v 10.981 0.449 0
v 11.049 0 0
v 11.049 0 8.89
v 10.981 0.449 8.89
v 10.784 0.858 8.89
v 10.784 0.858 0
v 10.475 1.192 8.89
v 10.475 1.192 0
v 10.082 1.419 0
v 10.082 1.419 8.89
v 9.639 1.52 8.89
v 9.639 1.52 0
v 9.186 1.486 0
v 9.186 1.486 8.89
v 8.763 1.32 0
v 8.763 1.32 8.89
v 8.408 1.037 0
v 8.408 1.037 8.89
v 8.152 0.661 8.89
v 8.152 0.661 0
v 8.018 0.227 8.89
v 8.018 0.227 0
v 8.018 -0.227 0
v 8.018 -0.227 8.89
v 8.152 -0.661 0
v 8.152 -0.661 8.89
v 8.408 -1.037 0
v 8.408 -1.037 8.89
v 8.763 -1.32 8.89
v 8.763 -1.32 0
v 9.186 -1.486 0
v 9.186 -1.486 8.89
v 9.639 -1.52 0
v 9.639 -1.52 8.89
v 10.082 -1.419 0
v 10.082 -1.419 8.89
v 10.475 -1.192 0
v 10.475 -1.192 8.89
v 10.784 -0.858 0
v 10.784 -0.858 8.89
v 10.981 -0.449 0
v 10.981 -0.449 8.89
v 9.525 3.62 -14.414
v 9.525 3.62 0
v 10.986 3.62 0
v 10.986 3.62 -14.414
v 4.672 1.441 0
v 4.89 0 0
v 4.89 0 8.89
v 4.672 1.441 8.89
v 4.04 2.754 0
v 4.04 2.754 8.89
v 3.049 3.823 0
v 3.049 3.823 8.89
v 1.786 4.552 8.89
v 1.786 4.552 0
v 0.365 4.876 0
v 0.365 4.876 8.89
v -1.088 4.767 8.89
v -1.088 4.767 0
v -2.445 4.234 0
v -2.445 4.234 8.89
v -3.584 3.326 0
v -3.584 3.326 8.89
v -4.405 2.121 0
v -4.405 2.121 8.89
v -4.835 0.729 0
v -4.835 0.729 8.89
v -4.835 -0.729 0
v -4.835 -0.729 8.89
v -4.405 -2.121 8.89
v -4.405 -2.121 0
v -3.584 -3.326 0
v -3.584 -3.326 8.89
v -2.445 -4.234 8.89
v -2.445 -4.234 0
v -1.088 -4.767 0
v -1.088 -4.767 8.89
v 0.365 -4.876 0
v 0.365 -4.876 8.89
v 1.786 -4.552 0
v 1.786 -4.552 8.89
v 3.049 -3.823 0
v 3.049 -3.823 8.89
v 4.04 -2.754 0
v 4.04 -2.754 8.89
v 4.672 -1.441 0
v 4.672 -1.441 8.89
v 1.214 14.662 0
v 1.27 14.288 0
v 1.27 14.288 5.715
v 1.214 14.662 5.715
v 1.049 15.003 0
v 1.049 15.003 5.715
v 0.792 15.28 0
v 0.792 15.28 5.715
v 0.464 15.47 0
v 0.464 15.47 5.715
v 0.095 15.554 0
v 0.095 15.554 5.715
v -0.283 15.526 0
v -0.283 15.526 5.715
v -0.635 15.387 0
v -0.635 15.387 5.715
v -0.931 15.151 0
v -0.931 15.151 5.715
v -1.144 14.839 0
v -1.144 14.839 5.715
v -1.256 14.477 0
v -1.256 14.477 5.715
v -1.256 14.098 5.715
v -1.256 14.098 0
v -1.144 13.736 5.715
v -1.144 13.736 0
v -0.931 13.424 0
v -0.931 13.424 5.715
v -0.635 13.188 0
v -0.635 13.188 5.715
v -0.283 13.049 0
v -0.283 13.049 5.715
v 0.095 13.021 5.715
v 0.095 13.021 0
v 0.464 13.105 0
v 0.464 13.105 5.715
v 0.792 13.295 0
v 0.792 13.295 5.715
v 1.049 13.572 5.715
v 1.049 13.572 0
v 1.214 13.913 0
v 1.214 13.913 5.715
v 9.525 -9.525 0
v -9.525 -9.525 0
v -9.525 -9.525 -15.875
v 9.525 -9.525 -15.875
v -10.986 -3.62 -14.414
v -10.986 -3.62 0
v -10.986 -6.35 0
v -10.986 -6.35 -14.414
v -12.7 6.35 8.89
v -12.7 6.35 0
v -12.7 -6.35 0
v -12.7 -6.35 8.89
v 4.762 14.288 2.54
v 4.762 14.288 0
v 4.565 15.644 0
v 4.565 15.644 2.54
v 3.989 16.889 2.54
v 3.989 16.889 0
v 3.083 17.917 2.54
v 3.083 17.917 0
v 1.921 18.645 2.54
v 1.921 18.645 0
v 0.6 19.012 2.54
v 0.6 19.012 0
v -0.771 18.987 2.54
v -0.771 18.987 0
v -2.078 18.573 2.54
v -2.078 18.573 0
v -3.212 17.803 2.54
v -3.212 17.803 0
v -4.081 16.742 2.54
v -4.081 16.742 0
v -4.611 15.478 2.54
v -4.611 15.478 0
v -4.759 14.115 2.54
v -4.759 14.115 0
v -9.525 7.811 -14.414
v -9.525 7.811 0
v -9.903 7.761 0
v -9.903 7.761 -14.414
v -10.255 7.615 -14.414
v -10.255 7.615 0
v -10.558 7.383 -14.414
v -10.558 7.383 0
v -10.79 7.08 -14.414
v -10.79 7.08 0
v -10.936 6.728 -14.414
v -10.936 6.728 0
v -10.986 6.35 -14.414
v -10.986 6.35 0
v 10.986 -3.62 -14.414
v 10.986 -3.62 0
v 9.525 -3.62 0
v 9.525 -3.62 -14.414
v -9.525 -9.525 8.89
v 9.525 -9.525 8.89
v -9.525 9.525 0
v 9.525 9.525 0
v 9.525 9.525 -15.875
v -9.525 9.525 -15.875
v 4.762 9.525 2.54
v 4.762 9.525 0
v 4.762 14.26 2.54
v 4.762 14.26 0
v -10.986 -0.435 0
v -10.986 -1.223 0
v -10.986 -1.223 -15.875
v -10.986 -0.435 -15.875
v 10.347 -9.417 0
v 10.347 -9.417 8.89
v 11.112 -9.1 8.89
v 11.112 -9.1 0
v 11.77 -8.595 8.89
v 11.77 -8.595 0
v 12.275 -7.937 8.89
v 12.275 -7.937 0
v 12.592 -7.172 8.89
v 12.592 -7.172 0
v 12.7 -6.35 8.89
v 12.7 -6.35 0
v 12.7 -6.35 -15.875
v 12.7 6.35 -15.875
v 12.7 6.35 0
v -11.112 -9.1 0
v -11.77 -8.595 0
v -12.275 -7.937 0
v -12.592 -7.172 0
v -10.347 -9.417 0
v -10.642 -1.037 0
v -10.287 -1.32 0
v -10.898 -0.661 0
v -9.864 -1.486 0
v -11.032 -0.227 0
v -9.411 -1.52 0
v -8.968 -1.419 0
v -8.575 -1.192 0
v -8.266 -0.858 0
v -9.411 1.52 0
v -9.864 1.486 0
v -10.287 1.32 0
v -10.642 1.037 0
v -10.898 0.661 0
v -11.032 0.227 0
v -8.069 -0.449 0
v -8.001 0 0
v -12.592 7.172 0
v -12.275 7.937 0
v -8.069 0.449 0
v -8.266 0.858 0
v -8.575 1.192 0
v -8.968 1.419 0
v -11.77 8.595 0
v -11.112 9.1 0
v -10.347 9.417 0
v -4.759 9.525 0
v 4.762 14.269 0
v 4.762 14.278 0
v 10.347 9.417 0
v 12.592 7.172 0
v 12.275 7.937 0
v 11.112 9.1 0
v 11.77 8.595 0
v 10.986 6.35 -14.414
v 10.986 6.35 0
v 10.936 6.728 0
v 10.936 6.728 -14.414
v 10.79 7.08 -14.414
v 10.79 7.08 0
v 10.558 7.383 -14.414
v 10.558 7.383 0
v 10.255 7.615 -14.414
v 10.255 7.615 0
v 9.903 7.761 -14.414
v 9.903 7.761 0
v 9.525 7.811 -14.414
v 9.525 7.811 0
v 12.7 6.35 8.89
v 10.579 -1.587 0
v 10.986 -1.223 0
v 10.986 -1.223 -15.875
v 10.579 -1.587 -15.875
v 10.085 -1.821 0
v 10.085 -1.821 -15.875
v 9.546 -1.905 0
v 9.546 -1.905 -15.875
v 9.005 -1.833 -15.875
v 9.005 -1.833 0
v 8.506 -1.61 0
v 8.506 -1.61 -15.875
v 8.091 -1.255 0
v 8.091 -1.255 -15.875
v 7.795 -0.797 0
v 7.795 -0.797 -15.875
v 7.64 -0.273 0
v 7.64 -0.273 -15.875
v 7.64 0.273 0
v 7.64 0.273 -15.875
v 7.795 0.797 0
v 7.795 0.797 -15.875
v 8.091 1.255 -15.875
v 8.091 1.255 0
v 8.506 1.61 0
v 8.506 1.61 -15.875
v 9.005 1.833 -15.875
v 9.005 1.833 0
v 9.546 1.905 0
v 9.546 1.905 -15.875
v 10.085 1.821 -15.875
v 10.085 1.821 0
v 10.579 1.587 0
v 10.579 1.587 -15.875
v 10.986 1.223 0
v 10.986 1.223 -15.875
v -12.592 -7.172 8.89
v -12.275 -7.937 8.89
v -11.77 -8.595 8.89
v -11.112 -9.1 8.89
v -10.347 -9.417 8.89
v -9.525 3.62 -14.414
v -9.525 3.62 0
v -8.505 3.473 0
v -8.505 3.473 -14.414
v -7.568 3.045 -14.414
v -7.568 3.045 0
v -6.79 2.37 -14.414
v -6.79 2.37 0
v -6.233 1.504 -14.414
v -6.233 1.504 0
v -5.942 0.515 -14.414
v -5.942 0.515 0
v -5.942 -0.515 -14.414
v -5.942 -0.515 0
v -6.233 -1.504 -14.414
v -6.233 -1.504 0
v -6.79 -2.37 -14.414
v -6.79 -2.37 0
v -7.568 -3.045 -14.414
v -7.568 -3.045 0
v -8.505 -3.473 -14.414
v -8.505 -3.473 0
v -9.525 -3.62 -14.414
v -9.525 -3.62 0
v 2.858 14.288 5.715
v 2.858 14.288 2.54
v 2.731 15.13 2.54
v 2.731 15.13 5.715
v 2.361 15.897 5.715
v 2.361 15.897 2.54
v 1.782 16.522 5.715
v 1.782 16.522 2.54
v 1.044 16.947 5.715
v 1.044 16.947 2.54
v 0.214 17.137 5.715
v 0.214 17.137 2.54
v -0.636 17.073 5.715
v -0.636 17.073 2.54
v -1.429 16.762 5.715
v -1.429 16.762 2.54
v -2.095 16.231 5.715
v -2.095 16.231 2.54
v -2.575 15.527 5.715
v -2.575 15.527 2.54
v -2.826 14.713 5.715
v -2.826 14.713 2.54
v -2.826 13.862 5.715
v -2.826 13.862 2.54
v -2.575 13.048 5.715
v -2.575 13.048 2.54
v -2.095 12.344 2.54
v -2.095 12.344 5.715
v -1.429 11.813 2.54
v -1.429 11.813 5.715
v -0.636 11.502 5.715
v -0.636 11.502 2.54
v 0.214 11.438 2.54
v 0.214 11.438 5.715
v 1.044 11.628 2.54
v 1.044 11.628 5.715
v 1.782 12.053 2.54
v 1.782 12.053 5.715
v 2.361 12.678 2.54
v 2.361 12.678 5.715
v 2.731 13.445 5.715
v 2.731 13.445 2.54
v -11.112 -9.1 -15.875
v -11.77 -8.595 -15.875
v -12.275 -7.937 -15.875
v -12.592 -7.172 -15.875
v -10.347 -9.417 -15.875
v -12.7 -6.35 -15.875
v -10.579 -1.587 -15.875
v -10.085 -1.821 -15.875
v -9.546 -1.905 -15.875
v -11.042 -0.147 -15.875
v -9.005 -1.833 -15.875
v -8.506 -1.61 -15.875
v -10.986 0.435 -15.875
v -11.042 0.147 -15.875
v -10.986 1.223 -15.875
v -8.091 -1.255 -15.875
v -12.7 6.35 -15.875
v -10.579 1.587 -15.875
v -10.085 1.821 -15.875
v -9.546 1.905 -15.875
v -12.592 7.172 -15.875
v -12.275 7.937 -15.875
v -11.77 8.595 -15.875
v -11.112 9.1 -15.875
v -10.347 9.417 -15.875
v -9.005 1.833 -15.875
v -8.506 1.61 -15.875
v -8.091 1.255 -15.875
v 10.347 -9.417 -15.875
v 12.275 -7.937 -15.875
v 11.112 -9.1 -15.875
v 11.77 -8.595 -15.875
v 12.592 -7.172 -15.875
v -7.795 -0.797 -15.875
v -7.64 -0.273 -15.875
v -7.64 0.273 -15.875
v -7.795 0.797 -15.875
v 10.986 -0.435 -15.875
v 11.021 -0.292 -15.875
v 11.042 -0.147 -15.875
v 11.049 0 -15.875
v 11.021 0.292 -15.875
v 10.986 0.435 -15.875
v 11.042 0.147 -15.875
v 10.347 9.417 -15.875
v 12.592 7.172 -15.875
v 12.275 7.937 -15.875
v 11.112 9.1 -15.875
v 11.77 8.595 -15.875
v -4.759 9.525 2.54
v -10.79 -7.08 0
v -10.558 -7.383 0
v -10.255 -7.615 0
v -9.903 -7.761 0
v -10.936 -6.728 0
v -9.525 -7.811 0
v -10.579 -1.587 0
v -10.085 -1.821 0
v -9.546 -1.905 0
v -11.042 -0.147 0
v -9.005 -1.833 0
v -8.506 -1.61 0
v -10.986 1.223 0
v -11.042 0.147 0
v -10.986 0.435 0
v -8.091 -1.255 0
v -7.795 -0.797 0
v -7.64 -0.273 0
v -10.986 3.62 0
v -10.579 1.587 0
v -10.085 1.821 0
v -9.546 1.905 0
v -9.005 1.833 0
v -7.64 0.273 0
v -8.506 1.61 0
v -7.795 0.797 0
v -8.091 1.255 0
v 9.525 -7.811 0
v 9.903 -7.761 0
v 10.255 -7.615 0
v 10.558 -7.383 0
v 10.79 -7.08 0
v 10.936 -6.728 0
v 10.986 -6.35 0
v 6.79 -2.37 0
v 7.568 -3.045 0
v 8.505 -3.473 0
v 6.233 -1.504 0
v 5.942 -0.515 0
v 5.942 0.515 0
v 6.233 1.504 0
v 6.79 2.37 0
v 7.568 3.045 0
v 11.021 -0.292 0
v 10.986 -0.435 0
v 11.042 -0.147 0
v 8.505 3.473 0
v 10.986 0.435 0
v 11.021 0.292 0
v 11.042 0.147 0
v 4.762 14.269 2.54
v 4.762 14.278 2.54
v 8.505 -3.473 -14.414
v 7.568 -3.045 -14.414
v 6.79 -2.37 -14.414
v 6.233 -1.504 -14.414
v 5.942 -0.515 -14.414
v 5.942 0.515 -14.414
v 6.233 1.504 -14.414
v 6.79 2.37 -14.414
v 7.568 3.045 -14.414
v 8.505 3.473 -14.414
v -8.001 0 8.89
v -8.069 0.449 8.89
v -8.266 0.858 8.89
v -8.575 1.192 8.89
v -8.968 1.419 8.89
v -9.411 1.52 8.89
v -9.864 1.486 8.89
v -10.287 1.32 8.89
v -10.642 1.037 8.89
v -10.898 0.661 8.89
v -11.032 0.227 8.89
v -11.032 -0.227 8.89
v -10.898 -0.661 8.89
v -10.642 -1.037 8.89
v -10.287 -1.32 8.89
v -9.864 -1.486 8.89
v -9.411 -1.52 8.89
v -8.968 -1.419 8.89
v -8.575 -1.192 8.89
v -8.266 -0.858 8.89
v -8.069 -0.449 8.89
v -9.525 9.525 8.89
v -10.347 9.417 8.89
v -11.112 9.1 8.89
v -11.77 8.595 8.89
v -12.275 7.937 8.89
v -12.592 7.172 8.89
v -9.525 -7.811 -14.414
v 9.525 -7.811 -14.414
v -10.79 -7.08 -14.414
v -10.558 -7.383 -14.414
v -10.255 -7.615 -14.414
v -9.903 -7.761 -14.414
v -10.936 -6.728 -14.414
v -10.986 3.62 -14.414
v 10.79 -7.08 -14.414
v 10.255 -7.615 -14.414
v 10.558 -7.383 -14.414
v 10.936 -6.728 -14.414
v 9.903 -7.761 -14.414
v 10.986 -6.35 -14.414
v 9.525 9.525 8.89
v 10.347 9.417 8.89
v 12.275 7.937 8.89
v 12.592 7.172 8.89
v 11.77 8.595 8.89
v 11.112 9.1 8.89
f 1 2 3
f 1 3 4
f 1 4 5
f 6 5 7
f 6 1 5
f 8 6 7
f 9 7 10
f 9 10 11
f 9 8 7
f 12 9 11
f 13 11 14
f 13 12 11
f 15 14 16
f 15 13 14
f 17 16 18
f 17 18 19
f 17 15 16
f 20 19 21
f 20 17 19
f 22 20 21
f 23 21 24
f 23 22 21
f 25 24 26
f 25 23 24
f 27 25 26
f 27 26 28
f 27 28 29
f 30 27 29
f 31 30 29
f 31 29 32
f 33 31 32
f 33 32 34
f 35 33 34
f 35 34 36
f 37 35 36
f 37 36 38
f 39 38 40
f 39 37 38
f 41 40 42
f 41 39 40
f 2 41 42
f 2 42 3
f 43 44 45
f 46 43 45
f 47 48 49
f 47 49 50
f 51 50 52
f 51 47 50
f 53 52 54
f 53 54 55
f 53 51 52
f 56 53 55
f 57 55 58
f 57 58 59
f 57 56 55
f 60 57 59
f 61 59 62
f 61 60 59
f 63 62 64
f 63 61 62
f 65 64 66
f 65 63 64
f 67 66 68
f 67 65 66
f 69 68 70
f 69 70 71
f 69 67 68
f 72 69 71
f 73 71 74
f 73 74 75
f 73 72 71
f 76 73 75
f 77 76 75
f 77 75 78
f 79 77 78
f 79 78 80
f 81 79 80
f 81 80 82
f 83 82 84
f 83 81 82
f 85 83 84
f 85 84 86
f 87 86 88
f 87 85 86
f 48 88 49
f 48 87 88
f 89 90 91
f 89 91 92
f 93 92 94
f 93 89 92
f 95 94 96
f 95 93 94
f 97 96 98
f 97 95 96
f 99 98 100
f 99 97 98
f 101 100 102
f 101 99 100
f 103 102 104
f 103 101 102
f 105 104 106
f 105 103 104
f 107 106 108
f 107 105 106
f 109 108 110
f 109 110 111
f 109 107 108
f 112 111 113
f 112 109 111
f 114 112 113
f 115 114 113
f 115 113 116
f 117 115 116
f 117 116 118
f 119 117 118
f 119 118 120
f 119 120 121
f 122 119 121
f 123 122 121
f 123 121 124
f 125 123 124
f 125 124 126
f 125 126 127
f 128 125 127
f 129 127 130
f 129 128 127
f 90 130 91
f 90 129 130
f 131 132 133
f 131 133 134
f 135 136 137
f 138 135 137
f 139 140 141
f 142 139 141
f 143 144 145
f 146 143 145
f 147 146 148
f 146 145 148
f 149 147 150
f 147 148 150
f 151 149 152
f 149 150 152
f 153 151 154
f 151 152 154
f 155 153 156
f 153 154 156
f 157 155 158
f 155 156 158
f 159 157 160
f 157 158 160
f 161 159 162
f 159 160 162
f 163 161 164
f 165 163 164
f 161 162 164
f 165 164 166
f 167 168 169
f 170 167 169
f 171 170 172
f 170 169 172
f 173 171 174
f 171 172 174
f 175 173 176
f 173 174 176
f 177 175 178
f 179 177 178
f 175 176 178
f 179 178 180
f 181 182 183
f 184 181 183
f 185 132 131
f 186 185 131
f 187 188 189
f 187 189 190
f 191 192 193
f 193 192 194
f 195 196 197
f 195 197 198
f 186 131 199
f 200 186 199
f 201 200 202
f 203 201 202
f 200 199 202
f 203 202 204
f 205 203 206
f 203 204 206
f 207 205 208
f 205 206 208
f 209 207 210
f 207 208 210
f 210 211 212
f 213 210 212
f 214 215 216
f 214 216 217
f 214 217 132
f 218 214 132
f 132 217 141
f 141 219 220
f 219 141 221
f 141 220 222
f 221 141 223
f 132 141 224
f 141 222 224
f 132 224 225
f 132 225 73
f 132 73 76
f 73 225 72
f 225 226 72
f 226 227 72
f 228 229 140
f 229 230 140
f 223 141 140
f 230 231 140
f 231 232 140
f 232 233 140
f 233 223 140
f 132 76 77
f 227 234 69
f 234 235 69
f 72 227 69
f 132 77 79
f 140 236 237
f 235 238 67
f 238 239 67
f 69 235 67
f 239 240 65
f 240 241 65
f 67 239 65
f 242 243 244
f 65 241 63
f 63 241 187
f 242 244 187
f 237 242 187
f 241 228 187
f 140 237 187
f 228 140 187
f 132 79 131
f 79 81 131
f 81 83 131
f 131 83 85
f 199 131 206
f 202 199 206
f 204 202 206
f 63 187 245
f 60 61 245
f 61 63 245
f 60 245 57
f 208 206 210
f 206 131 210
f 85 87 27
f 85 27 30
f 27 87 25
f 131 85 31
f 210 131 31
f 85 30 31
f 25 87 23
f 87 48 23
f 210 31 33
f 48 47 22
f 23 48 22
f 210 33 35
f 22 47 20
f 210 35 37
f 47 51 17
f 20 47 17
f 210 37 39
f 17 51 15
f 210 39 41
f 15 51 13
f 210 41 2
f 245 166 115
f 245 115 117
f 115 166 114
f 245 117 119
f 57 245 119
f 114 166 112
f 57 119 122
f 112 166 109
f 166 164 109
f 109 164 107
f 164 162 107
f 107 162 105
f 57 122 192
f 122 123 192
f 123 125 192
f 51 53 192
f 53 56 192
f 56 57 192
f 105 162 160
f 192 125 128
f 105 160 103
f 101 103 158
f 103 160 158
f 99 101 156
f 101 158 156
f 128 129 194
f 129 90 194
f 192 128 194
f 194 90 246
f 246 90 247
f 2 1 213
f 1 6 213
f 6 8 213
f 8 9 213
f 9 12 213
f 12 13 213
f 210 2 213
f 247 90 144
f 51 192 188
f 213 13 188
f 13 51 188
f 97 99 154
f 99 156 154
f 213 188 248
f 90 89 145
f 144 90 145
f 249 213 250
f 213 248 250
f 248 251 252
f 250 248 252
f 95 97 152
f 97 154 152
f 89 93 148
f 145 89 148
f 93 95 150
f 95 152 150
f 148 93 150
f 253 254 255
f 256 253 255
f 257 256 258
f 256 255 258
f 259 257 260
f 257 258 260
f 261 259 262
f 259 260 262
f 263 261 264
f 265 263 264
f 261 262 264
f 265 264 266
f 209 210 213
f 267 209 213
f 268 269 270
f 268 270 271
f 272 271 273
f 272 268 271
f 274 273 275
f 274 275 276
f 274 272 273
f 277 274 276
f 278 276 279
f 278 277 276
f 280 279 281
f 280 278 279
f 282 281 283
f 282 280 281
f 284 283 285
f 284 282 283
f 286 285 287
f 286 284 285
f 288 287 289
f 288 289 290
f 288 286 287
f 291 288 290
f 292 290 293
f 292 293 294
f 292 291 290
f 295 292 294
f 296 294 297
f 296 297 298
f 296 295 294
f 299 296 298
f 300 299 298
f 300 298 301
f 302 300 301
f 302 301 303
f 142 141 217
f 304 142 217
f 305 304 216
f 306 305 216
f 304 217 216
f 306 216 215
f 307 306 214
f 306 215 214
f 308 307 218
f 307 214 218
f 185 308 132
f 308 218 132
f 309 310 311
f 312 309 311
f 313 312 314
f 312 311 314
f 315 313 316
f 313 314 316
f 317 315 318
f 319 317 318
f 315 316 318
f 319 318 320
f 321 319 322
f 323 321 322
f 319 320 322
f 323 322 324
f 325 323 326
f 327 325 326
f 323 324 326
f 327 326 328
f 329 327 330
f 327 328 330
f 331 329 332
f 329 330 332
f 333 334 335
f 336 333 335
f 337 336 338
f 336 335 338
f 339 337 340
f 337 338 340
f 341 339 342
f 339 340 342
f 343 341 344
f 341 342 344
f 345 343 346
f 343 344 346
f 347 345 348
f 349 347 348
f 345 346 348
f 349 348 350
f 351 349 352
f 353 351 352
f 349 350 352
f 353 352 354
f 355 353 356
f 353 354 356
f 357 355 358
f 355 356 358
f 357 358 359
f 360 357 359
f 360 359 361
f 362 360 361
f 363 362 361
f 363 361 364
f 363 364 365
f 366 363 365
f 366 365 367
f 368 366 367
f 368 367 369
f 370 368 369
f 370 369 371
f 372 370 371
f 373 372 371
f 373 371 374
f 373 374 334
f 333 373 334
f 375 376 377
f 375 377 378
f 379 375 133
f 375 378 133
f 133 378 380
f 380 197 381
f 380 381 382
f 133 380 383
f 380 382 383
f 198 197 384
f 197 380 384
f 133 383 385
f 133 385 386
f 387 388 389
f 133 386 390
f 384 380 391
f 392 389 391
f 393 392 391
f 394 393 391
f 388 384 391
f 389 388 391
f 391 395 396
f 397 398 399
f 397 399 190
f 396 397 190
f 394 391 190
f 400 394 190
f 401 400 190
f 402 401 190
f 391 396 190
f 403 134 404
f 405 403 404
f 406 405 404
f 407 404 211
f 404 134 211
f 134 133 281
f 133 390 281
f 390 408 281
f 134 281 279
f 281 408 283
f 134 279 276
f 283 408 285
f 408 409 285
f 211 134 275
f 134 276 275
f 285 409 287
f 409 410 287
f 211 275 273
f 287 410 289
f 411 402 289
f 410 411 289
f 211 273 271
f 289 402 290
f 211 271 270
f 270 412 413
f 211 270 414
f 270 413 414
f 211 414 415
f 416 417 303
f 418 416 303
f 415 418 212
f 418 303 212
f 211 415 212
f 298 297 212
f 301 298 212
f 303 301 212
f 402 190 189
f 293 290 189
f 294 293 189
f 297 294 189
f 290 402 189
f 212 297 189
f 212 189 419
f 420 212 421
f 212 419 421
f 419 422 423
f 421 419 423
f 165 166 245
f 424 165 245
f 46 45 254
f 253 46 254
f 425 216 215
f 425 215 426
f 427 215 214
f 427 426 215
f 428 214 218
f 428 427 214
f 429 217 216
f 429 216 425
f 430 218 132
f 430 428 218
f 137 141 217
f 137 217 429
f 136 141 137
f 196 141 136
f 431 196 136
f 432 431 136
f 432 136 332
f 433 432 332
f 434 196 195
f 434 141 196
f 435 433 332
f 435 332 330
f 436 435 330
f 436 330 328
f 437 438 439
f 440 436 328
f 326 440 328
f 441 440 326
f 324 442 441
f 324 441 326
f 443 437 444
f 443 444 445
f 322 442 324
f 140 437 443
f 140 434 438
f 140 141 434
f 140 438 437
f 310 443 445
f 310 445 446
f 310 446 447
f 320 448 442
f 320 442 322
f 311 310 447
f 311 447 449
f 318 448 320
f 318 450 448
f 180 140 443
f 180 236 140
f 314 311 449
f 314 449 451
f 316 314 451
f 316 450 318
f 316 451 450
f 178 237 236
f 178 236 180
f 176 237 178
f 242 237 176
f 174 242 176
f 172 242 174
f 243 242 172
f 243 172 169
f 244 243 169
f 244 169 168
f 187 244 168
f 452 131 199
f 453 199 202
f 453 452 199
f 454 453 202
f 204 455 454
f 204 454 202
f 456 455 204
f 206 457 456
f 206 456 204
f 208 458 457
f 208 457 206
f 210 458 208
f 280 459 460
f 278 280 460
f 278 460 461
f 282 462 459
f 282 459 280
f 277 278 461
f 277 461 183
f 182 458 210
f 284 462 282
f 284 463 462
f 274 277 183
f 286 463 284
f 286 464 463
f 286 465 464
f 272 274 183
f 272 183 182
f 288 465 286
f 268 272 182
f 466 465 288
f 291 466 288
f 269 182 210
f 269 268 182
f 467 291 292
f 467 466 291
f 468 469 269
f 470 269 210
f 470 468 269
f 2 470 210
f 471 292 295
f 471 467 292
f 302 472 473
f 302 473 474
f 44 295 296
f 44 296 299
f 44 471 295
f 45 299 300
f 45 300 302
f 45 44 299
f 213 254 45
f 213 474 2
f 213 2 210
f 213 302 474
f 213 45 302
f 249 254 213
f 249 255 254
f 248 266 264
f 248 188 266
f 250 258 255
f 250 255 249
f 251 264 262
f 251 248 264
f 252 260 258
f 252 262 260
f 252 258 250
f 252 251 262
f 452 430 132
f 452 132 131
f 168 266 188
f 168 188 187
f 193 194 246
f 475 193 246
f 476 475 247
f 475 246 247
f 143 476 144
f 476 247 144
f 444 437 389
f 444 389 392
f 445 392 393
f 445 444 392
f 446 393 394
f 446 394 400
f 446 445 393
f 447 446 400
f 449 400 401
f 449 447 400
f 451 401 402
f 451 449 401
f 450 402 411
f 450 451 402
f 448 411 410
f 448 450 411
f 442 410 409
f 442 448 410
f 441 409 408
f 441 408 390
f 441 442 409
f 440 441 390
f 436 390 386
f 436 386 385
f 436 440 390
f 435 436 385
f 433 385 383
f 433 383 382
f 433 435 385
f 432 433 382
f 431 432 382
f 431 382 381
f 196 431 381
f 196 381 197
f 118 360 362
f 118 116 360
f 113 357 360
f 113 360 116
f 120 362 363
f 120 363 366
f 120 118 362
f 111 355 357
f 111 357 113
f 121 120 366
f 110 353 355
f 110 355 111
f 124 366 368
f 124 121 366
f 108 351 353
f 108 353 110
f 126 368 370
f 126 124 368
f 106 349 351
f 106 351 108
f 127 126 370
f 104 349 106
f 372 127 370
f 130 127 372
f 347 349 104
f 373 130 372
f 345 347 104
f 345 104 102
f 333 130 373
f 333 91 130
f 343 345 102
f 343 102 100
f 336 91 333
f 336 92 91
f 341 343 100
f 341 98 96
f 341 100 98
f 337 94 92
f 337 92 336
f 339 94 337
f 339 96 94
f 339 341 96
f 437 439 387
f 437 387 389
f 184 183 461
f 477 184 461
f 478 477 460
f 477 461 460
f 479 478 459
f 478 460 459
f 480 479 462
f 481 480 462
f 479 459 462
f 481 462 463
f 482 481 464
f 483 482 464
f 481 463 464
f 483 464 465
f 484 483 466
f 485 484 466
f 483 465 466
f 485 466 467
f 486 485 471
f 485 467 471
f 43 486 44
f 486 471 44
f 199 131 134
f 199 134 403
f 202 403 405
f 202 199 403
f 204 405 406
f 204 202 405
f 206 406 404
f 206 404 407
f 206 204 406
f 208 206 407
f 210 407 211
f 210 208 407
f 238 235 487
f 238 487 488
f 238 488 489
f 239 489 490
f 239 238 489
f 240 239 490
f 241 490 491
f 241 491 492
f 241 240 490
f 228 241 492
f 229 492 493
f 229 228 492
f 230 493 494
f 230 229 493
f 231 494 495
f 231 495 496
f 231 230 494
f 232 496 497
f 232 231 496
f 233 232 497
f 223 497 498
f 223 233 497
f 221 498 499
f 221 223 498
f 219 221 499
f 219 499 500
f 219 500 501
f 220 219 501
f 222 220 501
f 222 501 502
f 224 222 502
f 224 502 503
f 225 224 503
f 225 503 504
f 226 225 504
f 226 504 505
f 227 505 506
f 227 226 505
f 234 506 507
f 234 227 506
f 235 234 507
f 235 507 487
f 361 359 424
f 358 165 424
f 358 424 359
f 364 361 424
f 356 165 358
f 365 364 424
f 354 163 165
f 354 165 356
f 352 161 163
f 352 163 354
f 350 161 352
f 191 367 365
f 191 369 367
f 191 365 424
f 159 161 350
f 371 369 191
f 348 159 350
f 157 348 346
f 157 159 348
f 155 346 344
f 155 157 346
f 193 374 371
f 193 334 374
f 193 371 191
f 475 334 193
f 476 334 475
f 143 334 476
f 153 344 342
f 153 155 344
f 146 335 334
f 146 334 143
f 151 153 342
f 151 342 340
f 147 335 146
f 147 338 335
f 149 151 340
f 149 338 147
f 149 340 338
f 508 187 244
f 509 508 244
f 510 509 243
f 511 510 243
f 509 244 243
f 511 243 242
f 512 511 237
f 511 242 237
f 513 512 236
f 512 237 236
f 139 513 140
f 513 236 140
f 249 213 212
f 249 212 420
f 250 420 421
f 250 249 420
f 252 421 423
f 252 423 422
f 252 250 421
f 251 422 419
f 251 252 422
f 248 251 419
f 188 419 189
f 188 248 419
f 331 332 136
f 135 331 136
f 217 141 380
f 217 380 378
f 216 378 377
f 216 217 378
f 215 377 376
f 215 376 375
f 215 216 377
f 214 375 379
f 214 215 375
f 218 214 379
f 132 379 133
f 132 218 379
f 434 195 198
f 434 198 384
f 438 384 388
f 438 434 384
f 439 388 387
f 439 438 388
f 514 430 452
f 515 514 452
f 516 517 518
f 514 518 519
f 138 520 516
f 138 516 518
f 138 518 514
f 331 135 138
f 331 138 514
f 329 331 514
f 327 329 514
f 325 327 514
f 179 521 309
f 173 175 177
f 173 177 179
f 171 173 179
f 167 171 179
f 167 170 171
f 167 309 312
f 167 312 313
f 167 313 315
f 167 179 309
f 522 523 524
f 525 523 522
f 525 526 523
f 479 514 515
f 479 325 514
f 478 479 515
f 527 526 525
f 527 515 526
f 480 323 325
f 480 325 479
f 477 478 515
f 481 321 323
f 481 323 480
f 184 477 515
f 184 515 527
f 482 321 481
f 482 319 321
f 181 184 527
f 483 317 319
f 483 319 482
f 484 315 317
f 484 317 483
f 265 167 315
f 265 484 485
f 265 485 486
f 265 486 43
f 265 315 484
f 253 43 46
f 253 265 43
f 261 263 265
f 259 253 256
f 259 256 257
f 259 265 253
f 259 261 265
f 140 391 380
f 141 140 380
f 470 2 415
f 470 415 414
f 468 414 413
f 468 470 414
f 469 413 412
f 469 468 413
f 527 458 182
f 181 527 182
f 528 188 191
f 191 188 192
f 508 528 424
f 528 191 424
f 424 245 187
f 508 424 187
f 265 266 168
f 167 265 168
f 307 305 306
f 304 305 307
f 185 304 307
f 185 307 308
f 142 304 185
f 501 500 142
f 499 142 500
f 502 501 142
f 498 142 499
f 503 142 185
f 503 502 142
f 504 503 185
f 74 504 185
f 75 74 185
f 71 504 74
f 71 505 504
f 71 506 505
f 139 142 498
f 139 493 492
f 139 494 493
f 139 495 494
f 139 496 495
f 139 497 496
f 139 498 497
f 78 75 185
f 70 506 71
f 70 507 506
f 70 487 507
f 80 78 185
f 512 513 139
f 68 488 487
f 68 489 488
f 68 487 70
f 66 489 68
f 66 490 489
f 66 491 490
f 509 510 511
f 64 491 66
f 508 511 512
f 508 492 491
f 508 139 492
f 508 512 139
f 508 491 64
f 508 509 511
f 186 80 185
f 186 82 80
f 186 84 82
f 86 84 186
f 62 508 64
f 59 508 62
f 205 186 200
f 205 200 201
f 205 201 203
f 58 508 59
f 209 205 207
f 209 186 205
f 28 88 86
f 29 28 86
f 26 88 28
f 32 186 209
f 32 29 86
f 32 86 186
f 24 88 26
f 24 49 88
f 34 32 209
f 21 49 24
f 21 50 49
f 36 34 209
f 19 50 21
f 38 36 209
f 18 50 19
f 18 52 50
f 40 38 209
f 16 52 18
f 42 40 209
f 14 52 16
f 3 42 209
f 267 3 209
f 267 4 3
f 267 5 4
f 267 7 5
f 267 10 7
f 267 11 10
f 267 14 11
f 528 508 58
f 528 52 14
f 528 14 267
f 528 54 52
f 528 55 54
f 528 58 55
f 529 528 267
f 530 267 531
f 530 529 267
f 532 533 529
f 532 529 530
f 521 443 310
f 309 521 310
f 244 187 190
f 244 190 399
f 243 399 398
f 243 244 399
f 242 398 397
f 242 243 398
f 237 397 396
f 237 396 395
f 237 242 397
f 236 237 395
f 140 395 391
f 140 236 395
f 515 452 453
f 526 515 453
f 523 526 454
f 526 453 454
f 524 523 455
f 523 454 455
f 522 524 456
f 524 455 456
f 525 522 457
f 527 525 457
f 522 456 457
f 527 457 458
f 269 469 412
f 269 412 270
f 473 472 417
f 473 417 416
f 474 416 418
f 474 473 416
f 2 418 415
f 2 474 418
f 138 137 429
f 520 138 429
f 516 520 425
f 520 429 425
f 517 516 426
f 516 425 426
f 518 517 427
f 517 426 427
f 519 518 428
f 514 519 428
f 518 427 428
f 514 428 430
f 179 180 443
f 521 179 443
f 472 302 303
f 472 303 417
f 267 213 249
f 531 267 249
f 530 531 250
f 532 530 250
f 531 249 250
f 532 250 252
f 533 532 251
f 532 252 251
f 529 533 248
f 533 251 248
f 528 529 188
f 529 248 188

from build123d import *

# Parameters (mm, degrees)
F0_R     = 1.524
F0_R_2   = 4.8895
F1_DEPTH = 8.89
F0_R_3   = 2.8575
F2_DEPTH = 2.54
F0_R_4   = 1.27
F3_DEPTH = 5.715
F4_R     = 4.8895
F5_DEPTH = 15.875
F6_DEPTH = 14.4145


with BuildPart() as f1:
    # F0 (on Top) → F1 (new body)
    with BuildSketch(Plane.XY):
        with BuildLine():
            Line((-9.525, -9.525), (9.525, -9.525))
            ThreePointArc((9.525, -9.525), (11.770064, -8.595064), (12.7, -6.35))
            Line((12.7, -6.35), (12.7, 6.35))
            ThreePointArc((12.7, 6.35), (11.770064, 8.595064), (9.525, 9.525))
            Line((9.525, 9.525), (4.762421, 9.525))
            Line((4.762421, 9.525), (0, 9.525))
            Line((0, 9.525), (-4.759377, 9.525))
            Line((-4.759377, 9.525), (-9.525, 9.525))
            ThreePointArc((-9.525, 9.525), (-11.770064, 8.595064), (-12.7, 6.35))
            Line((-12.7, 6.35), (-12.7, -6.35))
            ThreePointArc((-12.7, -6.35), (-11.770064, -8.595064), (-9.525, -9.525))
        make_face()
        with Locations((-9.525, 0)):
            Circle(F0_R, mode=Mode.SUBTRACT)
        Circle(F0_R_2, mode=Mode.SUBTRACT)
        with Locations((9.525, 0)):
            Circle(F0_R, mode=Mode.SUBTRACT)
    extrude(amount=F1_DEPTH)

    # F0 (on Top) → F2 (join)
    with BuildSketch(Plane.XY):
        with BuildLine():
            Line((0, 9.525), (4.762421, 9.525))
            Line((4.762421, 9.525), (4.762421, 14.260068))
            ThreePointArc((4.762421, 14.260068), (3.357883, 10.910219), (0, 9.525))
        make_face()
        with BuildLine():
            Line((-4.759377, 14.115061), (-4.759377, 9.525))
            Line((-4.759377, 9.525), (0, 9.525))
            ThreePointArc((0, 9.525), (-3.306067, 10.859479), (-4.759377, 14.115061))
        make_face()
        with BuildLine():
            ThreePointArc((-4.759377, 14.115061), (-3.306067, 10.859479), (0, 9.525))
            ThreePointArc((0, 9.525), (3.357883, 10.910219), (4.762421, 14.260068))
            ThreePointArc((4.762421, 14.260068), (4.76248, 14.273784), (4.7625, 14.2875))
            ThreePointArc((4.7625, 14.2875), (-0.086234, 19.049219), (-4.759377, 14.115061))
        make_face()
        with Locations((0, 14.2875)):
            Circle(F0_R_3, mode=Mode.SUBTRACT)
    extrude(amount=F2_DEPTH)

    # F0 (on Top) → F3 (join)
    with BuildSketch(Plane.XY):
        with Locations((0, 14.2875)):
            Circle(F0_R_3)
        with Locations((0, 14.2875)):
            Circle(F0_R_4, mode=Mode.SUBTRACT)
    extrude(amount=F3_DEPTH)


with BuildPart() as f5:
    # F4 (on face) → F5 (new body)
    with BuildSketch(Plane.XY):
        with BuildLine():
            Line((-9.525, -9.525), (9.525, -9.525))
            ThreePointArc((9.525, -9.525), (11.770064, -8.595064), (12.7, -6.35))
            Line((12.7, -6.35), (12.7, 6.35))
            ThreePointArc((12.7, 6.35), (11.770064, 8.595064), (9.525, 9.525))
            Line((9.525, 9.525), (4.762421, 9.525))
            Line((4.762421, 9.525), (0, 9.525))
            Line((0, 9.525), (-4.759377, 9.525))
            Line((-4.759377, 9.525), (-9.525, 9.525))
            ThreePointArc((-9.525, 9.525), (-11.770064, 8.595064), (-12.7, 6.35))
            Line((-12.7, 6.35), (-12.7, -6.35))
            ThreePointArc((-12.7, -6.35), (-11.770064, -8.595064), (-9.525, -9.525))
        make_face()
        with BuildLine():
            Line((10.9855, 3.6195), (10.9855, 1.223096))
            Line((10.9855, 1.223096), (10.9855, 0.435334))
            ThreePointArc((10.9855, 0.435334), (11.033041, 0.21997), (11.049, 0))
            ThreePointArc((11.049, 0), (11.033041, -0.21997), (10.9855, -0.435334))
            Line((10.9855, -0.435334), (10.9855, -1.223096))
            Line((10.9855, -1.223096), (10.9855, -3.6195))
            Line((10.9855, -3.6195), (10.9855, -6.35))
            ThreePointArc((10.9855, -6.35), (10.557729, -7.382729), (9.525, -7.8105))
            Line((9.525, -7.8105), (-9.525, -7.8105))
            ThreePointArc((-9.525, -7.8105), (-10.557729, -7.382729), (-10.9855, -6.35))
            Line((-10.9855, -6.35), (-10.9855, -3.6195))
            Line((-10.9855, -3.6195), (-10.9855, -1.223096))
            Line((-10.9855, -1.223096), (-10.9855, -0.435334))
            ThreePointArc((-10.9855, -0.435334), (-11.049, 0), (-10.9855, 0.435334))
            Line((-10.9855, 0.435334), (-10.9855, 1.223096))
            Line((-10.9855, 1.223096), (-10.9855, 3.6195))
            Line((-10.9855, 3.6195), (-10.9855, 6.35))
            ThreePointArc((-10.9855, 6.35), (-10.557729, 7.382729), (-9.525, 7.8105))
            Line((-9.525, 7.8105), (9.525, 7.8105))
            ThreePointArc((9.525, 7.8105), (10.557729, 7.382729), (10.9855, 6.35))
            Line((10.9855, 6.35), (10.9855, 3.6195))
        make_face(mode=Mode.SUBTRACT)
        with BuildLine():
            Line((-9.525, 3.6195), (-10.9855, 3.6195))
            Line((-10.9855, 3.6195), (-10.9855, 1.223096))
            ThreePointArc((-10.9855, 1.223096), (-7.62, 0), (-10.9855, -1.223096))
            Line((-10.9855, -1.223096), (-10.9855, -3.6195))
            Line((-10.9855, -3.6195), (-9.525, -3.6195))
            ThreePointArc((-9.525, -3.6195), (-5.9055, 0), (-9.525, 3.6195))
        make_face()
        with BuildLine():
            ThreePointArc((10.9855, -1.223096), (7.62, 0), (10.9855, 1.223096))
            Line((10.9855, 1.223096), (10.9855, 3.6195))
            Line((10.9855, 3.6195), (9.525, 3.6195))
            ThreePointArc((9.525, 3.6195), (5.9055, 0), (9.525, -3.6195))
            Line((9.525, -3.6195), (10.9855, -3.6195))
            Line((10.9855, -3.6195), (10.9855, -1.223096))
        make_face()
        with BuildLine():
            Line((9.525, 3.6195), (10.9855, 3.6195))
            Line((10.9855, 3.6195), (10.9855, 6.35))
            ThreePointArc((10.9855, 6.35), (10.557729, 7.382729), (9.525, 7.8105))
            Line((9.525, 7.8105), (-9.525, 7.8105))
            ThreePointArc((-9.525, 7.8105), (-10.557729, 7.382729), (-10.9855, 6.35))
            Line((-10.9855, 6.35), (-10.9855, 3.6195))
            Line((-10.9855, 3.6195), (-9.525, 3.6195))
            ThreePointArc((-9.525, 3.6195), (-5.9055, 0), (-9.525, -3.6195))
            Line((-9.525, -3.6195), (-10.9855, -3.6195))
            Line((-10.9855, -3.6195), (-10.9855, -6.35))
            ThreePointArc((-10.9855, -6.35), (-10.557729, -7.382729), (-9.525, -7.8105))
            Line((-9.525, -7.8105), (9.525, -7.8105))
            ThreePointArc((9.525, -7.8105), (10.557729, -7.382729), (10.9855, -6.35))
            Line((10.9855, -6.35), (10.9855, -3.6195))
            Line((10.9855, -3.6195), (9.525, -3.6195))
            ThreePointArc((9.525, -3.6195), (5.9055, 0), (9.525, 3.6195))
        make_face()
        Circle(F4_R, mode=Mode.SUBTRACT)
        Circle(F4_R)
    extrude(amount=-F5_DEPTH)

    # F4 (on face) → F6 (cut)
    with BuildSketch(Plane.XY):
        with BuildLine():
            Line((9.525, 3.6195), (10.9855, 3.6195))
            Line((10.9855, 3.6195), (10.9855, 6.35))
            ThreePointArc((10.9855, 6.35), (10.557729, 7.382729), (9.525, 7.8105))
            Line((9.525, 7.8105), (-9.525, 7.8105))
            ThreePointArc((-9.525, 7.8105), (-10.557729, 7.382729), (-10.9855, 6.35))
            Line((-10.9855, 6.35), (-10.9855, 3.6195))
            Line((-10.9855, 3.6195), (-9.525, 3.6195))
            ThreePointArc((-9.525, 3.6195), (-5.9055, 0), (-9.525, -3.6195))
            Line((-9.525, -3.6195), (-10.9855, -3.6195))
            Line((-10.9855, -3.6195), (-10.9855, -6.35))
            ThreePointArc((-10.9855, -6.35), (-10.557729, -7.382729), (-9.525, -7.8105))
            Line((-9.525, -7.8105), (9.525, -7.8105))
            ThreePointArc((9.525, -7.8105), (10.557729, -7.382729), (10.9855, -6.35))
            Line((10.9855, -6.35), (10.9855, -3.6195))
            Line((10.9855, -3.6195), (9.525, -3.6195))
            ThreePointArc((9.525, -3.6195), (5.9055, 0), (9.525, 3.6195))
        make_face()
        Circle(F4_R, mode=Mode.SUBTRACT)
        Circle(F4_R)
    extrude(amount=-F6_DEPTH, mode=Mode.SUBTRACT)


solid = Compound([f1.part, f5.part])
